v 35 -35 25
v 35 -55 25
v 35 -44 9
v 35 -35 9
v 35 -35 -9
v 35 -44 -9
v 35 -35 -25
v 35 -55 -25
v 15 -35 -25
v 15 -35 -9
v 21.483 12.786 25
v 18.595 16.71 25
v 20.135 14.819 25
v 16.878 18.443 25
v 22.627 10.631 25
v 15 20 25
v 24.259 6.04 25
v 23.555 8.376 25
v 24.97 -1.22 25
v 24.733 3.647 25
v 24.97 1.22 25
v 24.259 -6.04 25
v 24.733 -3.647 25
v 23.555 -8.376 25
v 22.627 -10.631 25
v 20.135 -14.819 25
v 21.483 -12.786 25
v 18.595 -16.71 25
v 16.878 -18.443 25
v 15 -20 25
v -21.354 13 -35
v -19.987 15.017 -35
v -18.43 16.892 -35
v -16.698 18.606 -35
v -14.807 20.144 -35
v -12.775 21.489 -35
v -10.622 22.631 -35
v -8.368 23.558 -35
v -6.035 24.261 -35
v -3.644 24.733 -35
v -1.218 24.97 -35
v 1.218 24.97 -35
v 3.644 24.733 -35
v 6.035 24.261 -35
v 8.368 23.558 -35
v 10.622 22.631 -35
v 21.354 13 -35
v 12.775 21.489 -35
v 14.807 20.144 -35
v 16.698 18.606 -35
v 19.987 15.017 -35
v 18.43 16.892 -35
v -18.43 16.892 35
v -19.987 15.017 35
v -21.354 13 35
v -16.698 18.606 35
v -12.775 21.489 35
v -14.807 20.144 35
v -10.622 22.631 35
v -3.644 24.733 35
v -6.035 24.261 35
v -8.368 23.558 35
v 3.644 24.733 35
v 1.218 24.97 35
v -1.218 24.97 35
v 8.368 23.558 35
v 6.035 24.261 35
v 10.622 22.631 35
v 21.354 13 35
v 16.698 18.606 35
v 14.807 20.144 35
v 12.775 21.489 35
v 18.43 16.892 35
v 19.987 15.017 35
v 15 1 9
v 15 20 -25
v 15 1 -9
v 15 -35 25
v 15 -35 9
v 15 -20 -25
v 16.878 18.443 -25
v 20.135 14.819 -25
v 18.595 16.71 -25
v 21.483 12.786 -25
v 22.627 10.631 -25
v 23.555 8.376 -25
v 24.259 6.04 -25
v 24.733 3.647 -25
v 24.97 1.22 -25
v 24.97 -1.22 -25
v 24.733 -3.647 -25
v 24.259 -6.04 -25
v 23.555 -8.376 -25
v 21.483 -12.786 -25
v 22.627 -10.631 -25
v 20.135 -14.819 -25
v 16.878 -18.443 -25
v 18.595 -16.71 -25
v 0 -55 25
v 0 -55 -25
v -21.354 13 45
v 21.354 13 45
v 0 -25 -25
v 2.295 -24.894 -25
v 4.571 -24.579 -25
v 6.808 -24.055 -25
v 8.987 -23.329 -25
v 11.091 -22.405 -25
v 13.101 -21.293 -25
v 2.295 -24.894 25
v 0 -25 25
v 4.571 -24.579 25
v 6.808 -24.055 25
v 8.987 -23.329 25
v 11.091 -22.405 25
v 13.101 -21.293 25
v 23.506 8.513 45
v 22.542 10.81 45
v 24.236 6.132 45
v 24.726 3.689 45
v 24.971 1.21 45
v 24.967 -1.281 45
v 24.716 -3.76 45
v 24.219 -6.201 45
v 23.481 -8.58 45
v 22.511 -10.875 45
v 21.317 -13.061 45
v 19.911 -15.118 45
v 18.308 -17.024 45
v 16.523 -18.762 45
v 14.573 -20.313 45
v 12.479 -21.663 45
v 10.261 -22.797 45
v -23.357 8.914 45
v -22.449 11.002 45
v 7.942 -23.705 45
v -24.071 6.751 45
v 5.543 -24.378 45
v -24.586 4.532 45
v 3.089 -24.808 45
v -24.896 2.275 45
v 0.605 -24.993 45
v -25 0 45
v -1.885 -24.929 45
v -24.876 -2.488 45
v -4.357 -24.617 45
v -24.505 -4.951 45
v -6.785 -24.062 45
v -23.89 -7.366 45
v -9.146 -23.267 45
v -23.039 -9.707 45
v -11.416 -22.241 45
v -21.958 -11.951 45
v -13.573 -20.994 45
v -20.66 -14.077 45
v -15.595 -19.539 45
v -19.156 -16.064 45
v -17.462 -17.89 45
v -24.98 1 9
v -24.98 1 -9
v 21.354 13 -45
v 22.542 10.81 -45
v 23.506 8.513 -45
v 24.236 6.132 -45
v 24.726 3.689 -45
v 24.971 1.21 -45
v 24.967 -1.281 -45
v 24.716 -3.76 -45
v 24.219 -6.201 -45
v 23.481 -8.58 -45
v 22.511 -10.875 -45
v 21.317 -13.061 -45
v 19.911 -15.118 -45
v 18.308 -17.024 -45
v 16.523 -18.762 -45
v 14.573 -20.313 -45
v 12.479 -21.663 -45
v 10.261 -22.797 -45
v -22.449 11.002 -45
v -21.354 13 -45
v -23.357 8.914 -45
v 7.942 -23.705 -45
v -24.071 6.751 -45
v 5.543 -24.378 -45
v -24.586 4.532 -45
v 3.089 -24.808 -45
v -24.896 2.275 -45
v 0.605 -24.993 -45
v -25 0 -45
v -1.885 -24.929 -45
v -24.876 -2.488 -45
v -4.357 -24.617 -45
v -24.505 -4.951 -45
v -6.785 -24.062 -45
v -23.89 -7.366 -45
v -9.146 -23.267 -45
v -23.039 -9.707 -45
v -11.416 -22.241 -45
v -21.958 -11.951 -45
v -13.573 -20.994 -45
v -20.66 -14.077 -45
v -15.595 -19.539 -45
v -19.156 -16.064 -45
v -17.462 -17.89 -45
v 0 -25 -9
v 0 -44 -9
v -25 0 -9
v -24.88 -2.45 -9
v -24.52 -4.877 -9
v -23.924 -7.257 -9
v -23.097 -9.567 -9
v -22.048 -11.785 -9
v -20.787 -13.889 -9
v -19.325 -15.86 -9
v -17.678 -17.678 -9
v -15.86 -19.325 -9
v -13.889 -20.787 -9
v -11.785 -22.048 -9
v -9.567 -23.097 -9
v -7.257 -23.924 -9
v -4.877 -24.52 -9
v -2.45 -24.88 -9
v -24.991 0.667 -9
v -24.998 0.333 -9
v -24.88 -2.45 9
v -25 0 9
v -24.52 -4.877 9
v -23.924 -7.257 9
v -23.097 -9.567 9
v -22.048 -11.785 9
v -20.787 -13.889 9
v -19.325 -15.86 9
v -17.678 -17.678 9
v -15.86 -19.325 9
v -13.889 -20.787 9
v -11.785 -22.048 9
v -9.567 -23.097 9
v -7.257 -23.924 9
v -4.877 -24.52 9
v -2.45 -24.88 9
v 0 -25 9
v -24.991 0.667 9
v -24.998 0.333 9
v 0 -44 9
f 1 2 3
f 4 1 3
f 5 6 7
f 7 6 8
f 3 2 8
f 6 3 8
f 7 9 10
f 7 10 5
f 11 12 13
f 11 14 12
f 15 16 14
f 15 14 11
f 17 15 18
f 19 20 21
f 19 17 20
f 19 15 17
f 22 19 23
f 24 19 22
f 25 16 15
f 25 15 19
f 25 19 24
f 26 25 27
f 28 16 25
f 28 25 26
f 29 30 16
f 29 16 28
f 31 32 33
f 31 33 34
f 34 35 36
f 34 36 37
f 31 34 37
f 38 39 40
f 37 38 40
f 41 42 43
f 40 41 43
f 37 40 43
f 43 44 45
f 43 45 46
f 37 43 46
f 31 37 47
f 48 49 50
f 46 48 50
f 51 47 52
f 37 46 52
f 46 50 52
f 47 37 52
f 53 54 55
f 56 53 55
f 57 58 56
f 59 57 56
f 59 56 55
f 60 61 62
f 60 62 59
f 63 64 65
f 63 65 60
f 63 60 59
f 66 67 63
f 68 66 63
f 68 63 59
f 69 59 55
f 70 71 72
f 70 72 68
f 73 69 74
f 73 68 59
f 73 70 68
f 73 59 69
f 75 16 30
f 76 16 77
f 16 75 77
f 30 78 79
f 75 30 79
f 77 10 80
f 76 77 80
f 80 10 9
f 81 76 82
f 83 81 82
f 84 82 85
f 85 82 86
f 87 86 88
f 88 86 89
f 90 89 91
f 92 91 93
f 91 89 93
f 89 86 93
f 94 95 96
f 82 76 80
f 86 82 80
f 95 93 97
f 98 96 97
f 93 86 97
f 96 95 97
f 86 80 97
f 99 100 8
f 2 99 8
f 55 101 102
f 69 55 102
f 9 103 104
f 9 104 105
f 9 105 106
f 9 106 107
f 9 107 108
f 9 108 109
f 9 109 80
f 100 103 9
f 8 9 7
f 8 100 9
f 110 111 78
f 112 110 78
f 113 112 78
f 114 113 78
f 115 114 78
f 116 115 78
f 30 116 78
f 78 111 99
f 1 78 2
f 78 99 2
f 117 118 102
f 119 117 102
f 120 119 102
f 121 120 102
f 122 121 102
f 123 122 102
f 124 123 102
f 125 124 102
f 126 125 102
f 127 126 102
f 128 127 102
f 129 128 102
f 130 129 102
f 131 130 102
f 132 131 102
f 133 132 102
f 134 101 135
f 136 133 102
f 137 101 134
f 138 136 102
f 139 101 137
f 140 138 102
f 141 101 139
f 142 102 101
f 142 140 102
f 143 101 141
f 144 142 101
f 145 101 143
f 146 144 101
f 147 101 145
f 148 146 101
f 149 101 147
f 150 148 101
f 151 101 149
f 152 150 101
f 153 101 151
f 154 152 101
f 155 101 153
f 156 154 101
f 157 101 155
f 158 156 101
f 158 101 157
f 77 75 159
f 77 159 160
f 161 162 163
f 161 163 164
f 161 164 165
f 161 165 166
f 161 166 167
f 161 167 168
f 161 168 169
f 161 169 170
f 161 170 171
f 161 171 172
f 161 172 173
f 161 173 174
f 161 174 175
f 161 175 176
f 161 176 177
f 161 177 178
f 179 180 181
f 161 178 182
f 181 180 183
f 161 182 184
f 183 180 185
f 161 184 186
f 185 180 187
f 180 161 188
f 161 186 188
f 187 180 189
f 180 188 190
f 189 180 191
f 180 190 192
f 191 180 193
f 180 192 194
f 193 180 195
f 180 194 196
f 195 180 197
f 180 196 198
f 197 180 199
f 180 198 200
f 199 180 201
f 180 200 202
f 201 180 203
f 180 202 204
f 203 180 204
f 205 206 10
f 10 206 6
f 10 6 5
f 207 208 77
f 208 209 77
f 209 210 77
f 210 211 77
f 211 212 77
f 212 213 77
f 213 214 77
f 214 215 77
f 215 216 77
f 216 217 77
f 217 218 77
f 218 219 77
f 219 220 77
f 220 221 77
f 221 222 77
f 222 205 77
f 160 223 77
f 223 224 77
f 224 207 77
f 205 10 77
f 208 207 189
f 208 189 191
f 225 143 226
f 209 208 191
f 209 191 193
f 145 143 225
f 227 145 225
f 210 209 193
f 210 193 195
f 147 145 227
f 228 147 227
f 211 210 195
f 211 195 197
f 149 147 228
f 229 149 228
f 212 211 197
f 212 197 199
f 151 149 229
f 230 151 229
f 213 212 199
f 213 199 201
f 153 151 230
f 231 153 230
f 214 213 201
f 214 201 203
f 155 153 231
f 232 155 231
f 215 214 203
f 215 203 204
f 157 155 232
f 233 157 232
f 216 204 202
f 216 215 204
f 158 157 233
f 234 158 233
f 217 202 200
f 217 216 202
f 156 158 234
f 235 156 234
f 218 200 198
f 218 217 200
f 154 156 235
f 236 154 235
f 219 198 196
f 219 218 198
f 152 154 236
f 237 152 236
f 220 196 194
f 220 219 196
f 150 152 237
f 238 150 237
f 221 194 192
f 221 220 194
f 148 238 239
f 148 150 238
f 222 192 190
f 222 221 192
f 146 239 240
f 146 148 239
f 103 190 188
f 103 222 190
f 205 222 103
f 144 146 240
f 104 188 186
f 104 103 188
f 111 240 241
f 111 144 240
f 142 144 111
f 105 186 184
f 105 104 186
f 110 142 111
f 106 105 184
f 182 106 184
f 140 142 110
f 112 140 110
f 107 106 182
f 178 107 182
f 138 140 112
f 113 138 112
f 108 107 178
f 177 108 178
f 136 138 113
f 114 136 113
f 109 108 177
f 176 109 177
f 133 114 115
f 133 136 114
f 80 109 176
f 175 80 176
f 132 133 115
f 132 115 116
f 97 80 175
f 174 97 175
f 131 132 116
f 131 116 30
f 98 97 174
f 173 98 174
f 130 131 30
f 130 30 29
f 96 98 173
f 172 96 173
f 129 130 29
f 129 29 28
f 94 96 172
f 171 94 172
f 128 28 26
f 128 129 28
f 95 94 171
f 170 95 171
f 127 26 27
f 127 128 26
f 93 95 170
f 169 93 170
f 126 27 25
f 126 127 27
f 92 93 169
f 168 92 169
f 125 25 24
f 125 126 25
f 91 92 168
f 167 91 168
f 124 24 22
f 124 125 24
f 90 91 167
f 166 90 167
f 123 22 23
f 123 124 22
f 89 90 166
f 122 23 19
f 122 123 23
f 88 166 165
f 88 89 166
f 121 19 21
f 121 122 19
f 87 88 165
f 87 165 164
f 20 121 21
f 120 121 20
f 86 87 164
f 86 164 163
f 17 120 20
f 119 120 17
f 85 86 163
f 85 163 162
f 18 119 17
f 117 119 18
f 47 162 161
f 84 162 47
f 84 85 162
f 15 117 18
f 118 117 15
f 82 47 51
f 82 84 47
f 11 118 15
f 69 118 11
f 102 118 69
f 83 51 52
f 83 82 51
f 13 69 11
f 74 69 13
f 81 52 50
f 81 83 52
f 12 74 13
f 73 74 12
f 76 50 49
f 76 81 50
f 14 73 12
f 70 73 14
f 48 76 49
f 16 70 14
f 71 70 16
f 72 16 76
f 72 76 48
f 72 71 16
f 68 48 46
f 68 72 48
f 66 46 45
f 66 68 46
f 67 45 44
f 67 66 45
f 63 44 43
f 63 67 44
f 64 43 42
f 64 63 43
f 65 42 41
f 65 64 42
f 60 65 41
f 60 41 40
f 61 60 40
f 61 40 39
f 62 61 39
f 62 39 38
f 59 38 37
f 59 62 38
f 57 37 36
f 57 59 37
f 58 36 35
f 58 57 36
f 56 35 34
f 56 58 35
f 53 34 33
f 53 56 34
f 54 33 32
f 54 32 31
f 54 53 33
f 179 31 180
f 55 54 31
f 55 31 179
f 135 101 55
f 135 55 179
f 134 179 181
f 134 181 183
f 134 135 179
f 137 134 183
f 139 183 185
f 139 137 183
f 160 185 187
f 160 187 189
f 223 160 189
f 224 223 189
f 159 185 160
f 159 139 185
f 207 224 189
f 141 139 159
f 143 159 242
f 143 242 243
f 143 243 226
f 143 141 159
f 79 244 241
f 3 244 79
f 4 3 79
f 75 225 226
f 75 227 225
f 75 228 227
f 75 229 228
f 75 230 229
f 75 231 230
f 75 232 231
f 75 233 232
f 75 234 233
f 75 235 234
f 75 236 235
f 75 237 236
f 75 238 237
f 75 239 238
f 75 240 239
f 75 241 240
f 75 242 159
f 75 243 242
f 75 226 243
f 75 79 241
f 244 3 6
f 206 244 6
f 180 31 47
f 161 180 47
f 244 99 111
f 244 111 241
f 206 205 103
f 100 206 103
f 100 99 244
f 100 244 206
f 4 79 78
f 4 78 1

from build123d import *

# Parameters (mm, degrees)
CROQUIS1_R                 = 25
SALIENTE_EXTRUIR1_DEPTH    = 45
CORTAR_EXTRUIR1_DEPTH      = 10
CORTAR_EXTRUIR2_START      = -80
CORTAR_EXTRUIR2_DEPTH      = 10
CROQUIS3_W                 = 35
CROQUIS3_H                 = 50
SALIENTE_EXTRUIR2_DEPTH    = 68
CORTAR_EXTRUIR4_DEPTH      = 89.735562206
CORTAR_EXTRUIR4_DEPTH_BACK = 48
CROQUIS4_W                 = 20
CROQUIS4_H                 = 50
CROQUIS5_W                 = 18
CROQUIS5_H                 = 45
CORTAR_EXTRUIR5_DEPTH      = 94.005376189


with BuildPart() as part:
    # Croquis1 → Saliente-Extruir1 (new, symmetric)
    with BuildSketch(Plane.XY):
        with Locations(Location((0, 0, 0), (0, 0, 180))):
            Circle(CROQUIS1_R)
    extrude(amount=SALIENTE_EXTRUIR1_DEPTH, both=True)

    # Croquis2 → Cortar-Extruir1 (cut)
    with BuildSketch(Plane.XY.offset(45)):
        with BuildLine():
            Line((-21.354156504, 13), (21.354156504, 13))
            ThreePointArc((21.354156504, 13), (0, 25), (-21.354156504, 13))
        make_face()
    extrude(amount=-CORTAR_EXTRUIR1_DEPTH, mode=Mode.SUBTRACT)

    # Croquis2<2> → Cortar-Extruir2 (cut)
    with BuildSketch(Plane.XY.offset(45).offset(CORTAR_EXTRUIR2_START)):
        with BuildLine():
            Line((-21.354156504, 13), (21.354156504, 13))
            ThreePointArc((21.354156504, 13), (0, 25), (-21.354156504, 13))
        make_face()
    extrude(amount=-CORTAR_EXTRUIR2_DEPTH, mode=Mode.SUBTRACT)

    # Croquis3 → Saliente-Extruir2 (add)
    with BuildSketch(Plane(origin=(0, -55, 0), x_dir=(1, 0, 0), z_dir=(0, 1, 0))):
        with Locations((17.5, 0)):
            Rectangle(CROQUIS3_W, CROQUIS3_H)
    extrude(amount=SALIENTE_EXTRUIR2_DEPTH)

    # Croquis4 → Cortar-Extruir4 (cut, two sides: drawn at the far end of the back side and taken through both)
    with BuildSketch(Plane(origin=(0, 13, 0), x_dir=(1, 0, 0), z_dir=(0, 1, 0)).offset(-CORTAR_EXTRUIR4_DEPTH_BACK)):
        with Locations((25, 0)):
            Rectangle(CROQUIS4_W, CROQUIS4_H)
    extrude(amount=CORTAR_EXTRUIR4_DEPTH + CORTAR_EXTRUIR4_DEPTH_BACK, mode=Mode.SUBTRACT)

    # Croquis5 → Cortar-Extruir5 (cut, through all)
    with BuildSketch(Plane(origin=(35, 0, 0), x_dir=(0, 0, -1), z_dir=(1, 0, 0))):
        with Locations((0, -21.5)):
            Rectangle(CROQUIS5_W, CROQUIS5_H)
    extrude(amount=-CORTAR_EXTRUIR5_DEPTH, mode=Mode.SUBTRACT)


solid = part.part
